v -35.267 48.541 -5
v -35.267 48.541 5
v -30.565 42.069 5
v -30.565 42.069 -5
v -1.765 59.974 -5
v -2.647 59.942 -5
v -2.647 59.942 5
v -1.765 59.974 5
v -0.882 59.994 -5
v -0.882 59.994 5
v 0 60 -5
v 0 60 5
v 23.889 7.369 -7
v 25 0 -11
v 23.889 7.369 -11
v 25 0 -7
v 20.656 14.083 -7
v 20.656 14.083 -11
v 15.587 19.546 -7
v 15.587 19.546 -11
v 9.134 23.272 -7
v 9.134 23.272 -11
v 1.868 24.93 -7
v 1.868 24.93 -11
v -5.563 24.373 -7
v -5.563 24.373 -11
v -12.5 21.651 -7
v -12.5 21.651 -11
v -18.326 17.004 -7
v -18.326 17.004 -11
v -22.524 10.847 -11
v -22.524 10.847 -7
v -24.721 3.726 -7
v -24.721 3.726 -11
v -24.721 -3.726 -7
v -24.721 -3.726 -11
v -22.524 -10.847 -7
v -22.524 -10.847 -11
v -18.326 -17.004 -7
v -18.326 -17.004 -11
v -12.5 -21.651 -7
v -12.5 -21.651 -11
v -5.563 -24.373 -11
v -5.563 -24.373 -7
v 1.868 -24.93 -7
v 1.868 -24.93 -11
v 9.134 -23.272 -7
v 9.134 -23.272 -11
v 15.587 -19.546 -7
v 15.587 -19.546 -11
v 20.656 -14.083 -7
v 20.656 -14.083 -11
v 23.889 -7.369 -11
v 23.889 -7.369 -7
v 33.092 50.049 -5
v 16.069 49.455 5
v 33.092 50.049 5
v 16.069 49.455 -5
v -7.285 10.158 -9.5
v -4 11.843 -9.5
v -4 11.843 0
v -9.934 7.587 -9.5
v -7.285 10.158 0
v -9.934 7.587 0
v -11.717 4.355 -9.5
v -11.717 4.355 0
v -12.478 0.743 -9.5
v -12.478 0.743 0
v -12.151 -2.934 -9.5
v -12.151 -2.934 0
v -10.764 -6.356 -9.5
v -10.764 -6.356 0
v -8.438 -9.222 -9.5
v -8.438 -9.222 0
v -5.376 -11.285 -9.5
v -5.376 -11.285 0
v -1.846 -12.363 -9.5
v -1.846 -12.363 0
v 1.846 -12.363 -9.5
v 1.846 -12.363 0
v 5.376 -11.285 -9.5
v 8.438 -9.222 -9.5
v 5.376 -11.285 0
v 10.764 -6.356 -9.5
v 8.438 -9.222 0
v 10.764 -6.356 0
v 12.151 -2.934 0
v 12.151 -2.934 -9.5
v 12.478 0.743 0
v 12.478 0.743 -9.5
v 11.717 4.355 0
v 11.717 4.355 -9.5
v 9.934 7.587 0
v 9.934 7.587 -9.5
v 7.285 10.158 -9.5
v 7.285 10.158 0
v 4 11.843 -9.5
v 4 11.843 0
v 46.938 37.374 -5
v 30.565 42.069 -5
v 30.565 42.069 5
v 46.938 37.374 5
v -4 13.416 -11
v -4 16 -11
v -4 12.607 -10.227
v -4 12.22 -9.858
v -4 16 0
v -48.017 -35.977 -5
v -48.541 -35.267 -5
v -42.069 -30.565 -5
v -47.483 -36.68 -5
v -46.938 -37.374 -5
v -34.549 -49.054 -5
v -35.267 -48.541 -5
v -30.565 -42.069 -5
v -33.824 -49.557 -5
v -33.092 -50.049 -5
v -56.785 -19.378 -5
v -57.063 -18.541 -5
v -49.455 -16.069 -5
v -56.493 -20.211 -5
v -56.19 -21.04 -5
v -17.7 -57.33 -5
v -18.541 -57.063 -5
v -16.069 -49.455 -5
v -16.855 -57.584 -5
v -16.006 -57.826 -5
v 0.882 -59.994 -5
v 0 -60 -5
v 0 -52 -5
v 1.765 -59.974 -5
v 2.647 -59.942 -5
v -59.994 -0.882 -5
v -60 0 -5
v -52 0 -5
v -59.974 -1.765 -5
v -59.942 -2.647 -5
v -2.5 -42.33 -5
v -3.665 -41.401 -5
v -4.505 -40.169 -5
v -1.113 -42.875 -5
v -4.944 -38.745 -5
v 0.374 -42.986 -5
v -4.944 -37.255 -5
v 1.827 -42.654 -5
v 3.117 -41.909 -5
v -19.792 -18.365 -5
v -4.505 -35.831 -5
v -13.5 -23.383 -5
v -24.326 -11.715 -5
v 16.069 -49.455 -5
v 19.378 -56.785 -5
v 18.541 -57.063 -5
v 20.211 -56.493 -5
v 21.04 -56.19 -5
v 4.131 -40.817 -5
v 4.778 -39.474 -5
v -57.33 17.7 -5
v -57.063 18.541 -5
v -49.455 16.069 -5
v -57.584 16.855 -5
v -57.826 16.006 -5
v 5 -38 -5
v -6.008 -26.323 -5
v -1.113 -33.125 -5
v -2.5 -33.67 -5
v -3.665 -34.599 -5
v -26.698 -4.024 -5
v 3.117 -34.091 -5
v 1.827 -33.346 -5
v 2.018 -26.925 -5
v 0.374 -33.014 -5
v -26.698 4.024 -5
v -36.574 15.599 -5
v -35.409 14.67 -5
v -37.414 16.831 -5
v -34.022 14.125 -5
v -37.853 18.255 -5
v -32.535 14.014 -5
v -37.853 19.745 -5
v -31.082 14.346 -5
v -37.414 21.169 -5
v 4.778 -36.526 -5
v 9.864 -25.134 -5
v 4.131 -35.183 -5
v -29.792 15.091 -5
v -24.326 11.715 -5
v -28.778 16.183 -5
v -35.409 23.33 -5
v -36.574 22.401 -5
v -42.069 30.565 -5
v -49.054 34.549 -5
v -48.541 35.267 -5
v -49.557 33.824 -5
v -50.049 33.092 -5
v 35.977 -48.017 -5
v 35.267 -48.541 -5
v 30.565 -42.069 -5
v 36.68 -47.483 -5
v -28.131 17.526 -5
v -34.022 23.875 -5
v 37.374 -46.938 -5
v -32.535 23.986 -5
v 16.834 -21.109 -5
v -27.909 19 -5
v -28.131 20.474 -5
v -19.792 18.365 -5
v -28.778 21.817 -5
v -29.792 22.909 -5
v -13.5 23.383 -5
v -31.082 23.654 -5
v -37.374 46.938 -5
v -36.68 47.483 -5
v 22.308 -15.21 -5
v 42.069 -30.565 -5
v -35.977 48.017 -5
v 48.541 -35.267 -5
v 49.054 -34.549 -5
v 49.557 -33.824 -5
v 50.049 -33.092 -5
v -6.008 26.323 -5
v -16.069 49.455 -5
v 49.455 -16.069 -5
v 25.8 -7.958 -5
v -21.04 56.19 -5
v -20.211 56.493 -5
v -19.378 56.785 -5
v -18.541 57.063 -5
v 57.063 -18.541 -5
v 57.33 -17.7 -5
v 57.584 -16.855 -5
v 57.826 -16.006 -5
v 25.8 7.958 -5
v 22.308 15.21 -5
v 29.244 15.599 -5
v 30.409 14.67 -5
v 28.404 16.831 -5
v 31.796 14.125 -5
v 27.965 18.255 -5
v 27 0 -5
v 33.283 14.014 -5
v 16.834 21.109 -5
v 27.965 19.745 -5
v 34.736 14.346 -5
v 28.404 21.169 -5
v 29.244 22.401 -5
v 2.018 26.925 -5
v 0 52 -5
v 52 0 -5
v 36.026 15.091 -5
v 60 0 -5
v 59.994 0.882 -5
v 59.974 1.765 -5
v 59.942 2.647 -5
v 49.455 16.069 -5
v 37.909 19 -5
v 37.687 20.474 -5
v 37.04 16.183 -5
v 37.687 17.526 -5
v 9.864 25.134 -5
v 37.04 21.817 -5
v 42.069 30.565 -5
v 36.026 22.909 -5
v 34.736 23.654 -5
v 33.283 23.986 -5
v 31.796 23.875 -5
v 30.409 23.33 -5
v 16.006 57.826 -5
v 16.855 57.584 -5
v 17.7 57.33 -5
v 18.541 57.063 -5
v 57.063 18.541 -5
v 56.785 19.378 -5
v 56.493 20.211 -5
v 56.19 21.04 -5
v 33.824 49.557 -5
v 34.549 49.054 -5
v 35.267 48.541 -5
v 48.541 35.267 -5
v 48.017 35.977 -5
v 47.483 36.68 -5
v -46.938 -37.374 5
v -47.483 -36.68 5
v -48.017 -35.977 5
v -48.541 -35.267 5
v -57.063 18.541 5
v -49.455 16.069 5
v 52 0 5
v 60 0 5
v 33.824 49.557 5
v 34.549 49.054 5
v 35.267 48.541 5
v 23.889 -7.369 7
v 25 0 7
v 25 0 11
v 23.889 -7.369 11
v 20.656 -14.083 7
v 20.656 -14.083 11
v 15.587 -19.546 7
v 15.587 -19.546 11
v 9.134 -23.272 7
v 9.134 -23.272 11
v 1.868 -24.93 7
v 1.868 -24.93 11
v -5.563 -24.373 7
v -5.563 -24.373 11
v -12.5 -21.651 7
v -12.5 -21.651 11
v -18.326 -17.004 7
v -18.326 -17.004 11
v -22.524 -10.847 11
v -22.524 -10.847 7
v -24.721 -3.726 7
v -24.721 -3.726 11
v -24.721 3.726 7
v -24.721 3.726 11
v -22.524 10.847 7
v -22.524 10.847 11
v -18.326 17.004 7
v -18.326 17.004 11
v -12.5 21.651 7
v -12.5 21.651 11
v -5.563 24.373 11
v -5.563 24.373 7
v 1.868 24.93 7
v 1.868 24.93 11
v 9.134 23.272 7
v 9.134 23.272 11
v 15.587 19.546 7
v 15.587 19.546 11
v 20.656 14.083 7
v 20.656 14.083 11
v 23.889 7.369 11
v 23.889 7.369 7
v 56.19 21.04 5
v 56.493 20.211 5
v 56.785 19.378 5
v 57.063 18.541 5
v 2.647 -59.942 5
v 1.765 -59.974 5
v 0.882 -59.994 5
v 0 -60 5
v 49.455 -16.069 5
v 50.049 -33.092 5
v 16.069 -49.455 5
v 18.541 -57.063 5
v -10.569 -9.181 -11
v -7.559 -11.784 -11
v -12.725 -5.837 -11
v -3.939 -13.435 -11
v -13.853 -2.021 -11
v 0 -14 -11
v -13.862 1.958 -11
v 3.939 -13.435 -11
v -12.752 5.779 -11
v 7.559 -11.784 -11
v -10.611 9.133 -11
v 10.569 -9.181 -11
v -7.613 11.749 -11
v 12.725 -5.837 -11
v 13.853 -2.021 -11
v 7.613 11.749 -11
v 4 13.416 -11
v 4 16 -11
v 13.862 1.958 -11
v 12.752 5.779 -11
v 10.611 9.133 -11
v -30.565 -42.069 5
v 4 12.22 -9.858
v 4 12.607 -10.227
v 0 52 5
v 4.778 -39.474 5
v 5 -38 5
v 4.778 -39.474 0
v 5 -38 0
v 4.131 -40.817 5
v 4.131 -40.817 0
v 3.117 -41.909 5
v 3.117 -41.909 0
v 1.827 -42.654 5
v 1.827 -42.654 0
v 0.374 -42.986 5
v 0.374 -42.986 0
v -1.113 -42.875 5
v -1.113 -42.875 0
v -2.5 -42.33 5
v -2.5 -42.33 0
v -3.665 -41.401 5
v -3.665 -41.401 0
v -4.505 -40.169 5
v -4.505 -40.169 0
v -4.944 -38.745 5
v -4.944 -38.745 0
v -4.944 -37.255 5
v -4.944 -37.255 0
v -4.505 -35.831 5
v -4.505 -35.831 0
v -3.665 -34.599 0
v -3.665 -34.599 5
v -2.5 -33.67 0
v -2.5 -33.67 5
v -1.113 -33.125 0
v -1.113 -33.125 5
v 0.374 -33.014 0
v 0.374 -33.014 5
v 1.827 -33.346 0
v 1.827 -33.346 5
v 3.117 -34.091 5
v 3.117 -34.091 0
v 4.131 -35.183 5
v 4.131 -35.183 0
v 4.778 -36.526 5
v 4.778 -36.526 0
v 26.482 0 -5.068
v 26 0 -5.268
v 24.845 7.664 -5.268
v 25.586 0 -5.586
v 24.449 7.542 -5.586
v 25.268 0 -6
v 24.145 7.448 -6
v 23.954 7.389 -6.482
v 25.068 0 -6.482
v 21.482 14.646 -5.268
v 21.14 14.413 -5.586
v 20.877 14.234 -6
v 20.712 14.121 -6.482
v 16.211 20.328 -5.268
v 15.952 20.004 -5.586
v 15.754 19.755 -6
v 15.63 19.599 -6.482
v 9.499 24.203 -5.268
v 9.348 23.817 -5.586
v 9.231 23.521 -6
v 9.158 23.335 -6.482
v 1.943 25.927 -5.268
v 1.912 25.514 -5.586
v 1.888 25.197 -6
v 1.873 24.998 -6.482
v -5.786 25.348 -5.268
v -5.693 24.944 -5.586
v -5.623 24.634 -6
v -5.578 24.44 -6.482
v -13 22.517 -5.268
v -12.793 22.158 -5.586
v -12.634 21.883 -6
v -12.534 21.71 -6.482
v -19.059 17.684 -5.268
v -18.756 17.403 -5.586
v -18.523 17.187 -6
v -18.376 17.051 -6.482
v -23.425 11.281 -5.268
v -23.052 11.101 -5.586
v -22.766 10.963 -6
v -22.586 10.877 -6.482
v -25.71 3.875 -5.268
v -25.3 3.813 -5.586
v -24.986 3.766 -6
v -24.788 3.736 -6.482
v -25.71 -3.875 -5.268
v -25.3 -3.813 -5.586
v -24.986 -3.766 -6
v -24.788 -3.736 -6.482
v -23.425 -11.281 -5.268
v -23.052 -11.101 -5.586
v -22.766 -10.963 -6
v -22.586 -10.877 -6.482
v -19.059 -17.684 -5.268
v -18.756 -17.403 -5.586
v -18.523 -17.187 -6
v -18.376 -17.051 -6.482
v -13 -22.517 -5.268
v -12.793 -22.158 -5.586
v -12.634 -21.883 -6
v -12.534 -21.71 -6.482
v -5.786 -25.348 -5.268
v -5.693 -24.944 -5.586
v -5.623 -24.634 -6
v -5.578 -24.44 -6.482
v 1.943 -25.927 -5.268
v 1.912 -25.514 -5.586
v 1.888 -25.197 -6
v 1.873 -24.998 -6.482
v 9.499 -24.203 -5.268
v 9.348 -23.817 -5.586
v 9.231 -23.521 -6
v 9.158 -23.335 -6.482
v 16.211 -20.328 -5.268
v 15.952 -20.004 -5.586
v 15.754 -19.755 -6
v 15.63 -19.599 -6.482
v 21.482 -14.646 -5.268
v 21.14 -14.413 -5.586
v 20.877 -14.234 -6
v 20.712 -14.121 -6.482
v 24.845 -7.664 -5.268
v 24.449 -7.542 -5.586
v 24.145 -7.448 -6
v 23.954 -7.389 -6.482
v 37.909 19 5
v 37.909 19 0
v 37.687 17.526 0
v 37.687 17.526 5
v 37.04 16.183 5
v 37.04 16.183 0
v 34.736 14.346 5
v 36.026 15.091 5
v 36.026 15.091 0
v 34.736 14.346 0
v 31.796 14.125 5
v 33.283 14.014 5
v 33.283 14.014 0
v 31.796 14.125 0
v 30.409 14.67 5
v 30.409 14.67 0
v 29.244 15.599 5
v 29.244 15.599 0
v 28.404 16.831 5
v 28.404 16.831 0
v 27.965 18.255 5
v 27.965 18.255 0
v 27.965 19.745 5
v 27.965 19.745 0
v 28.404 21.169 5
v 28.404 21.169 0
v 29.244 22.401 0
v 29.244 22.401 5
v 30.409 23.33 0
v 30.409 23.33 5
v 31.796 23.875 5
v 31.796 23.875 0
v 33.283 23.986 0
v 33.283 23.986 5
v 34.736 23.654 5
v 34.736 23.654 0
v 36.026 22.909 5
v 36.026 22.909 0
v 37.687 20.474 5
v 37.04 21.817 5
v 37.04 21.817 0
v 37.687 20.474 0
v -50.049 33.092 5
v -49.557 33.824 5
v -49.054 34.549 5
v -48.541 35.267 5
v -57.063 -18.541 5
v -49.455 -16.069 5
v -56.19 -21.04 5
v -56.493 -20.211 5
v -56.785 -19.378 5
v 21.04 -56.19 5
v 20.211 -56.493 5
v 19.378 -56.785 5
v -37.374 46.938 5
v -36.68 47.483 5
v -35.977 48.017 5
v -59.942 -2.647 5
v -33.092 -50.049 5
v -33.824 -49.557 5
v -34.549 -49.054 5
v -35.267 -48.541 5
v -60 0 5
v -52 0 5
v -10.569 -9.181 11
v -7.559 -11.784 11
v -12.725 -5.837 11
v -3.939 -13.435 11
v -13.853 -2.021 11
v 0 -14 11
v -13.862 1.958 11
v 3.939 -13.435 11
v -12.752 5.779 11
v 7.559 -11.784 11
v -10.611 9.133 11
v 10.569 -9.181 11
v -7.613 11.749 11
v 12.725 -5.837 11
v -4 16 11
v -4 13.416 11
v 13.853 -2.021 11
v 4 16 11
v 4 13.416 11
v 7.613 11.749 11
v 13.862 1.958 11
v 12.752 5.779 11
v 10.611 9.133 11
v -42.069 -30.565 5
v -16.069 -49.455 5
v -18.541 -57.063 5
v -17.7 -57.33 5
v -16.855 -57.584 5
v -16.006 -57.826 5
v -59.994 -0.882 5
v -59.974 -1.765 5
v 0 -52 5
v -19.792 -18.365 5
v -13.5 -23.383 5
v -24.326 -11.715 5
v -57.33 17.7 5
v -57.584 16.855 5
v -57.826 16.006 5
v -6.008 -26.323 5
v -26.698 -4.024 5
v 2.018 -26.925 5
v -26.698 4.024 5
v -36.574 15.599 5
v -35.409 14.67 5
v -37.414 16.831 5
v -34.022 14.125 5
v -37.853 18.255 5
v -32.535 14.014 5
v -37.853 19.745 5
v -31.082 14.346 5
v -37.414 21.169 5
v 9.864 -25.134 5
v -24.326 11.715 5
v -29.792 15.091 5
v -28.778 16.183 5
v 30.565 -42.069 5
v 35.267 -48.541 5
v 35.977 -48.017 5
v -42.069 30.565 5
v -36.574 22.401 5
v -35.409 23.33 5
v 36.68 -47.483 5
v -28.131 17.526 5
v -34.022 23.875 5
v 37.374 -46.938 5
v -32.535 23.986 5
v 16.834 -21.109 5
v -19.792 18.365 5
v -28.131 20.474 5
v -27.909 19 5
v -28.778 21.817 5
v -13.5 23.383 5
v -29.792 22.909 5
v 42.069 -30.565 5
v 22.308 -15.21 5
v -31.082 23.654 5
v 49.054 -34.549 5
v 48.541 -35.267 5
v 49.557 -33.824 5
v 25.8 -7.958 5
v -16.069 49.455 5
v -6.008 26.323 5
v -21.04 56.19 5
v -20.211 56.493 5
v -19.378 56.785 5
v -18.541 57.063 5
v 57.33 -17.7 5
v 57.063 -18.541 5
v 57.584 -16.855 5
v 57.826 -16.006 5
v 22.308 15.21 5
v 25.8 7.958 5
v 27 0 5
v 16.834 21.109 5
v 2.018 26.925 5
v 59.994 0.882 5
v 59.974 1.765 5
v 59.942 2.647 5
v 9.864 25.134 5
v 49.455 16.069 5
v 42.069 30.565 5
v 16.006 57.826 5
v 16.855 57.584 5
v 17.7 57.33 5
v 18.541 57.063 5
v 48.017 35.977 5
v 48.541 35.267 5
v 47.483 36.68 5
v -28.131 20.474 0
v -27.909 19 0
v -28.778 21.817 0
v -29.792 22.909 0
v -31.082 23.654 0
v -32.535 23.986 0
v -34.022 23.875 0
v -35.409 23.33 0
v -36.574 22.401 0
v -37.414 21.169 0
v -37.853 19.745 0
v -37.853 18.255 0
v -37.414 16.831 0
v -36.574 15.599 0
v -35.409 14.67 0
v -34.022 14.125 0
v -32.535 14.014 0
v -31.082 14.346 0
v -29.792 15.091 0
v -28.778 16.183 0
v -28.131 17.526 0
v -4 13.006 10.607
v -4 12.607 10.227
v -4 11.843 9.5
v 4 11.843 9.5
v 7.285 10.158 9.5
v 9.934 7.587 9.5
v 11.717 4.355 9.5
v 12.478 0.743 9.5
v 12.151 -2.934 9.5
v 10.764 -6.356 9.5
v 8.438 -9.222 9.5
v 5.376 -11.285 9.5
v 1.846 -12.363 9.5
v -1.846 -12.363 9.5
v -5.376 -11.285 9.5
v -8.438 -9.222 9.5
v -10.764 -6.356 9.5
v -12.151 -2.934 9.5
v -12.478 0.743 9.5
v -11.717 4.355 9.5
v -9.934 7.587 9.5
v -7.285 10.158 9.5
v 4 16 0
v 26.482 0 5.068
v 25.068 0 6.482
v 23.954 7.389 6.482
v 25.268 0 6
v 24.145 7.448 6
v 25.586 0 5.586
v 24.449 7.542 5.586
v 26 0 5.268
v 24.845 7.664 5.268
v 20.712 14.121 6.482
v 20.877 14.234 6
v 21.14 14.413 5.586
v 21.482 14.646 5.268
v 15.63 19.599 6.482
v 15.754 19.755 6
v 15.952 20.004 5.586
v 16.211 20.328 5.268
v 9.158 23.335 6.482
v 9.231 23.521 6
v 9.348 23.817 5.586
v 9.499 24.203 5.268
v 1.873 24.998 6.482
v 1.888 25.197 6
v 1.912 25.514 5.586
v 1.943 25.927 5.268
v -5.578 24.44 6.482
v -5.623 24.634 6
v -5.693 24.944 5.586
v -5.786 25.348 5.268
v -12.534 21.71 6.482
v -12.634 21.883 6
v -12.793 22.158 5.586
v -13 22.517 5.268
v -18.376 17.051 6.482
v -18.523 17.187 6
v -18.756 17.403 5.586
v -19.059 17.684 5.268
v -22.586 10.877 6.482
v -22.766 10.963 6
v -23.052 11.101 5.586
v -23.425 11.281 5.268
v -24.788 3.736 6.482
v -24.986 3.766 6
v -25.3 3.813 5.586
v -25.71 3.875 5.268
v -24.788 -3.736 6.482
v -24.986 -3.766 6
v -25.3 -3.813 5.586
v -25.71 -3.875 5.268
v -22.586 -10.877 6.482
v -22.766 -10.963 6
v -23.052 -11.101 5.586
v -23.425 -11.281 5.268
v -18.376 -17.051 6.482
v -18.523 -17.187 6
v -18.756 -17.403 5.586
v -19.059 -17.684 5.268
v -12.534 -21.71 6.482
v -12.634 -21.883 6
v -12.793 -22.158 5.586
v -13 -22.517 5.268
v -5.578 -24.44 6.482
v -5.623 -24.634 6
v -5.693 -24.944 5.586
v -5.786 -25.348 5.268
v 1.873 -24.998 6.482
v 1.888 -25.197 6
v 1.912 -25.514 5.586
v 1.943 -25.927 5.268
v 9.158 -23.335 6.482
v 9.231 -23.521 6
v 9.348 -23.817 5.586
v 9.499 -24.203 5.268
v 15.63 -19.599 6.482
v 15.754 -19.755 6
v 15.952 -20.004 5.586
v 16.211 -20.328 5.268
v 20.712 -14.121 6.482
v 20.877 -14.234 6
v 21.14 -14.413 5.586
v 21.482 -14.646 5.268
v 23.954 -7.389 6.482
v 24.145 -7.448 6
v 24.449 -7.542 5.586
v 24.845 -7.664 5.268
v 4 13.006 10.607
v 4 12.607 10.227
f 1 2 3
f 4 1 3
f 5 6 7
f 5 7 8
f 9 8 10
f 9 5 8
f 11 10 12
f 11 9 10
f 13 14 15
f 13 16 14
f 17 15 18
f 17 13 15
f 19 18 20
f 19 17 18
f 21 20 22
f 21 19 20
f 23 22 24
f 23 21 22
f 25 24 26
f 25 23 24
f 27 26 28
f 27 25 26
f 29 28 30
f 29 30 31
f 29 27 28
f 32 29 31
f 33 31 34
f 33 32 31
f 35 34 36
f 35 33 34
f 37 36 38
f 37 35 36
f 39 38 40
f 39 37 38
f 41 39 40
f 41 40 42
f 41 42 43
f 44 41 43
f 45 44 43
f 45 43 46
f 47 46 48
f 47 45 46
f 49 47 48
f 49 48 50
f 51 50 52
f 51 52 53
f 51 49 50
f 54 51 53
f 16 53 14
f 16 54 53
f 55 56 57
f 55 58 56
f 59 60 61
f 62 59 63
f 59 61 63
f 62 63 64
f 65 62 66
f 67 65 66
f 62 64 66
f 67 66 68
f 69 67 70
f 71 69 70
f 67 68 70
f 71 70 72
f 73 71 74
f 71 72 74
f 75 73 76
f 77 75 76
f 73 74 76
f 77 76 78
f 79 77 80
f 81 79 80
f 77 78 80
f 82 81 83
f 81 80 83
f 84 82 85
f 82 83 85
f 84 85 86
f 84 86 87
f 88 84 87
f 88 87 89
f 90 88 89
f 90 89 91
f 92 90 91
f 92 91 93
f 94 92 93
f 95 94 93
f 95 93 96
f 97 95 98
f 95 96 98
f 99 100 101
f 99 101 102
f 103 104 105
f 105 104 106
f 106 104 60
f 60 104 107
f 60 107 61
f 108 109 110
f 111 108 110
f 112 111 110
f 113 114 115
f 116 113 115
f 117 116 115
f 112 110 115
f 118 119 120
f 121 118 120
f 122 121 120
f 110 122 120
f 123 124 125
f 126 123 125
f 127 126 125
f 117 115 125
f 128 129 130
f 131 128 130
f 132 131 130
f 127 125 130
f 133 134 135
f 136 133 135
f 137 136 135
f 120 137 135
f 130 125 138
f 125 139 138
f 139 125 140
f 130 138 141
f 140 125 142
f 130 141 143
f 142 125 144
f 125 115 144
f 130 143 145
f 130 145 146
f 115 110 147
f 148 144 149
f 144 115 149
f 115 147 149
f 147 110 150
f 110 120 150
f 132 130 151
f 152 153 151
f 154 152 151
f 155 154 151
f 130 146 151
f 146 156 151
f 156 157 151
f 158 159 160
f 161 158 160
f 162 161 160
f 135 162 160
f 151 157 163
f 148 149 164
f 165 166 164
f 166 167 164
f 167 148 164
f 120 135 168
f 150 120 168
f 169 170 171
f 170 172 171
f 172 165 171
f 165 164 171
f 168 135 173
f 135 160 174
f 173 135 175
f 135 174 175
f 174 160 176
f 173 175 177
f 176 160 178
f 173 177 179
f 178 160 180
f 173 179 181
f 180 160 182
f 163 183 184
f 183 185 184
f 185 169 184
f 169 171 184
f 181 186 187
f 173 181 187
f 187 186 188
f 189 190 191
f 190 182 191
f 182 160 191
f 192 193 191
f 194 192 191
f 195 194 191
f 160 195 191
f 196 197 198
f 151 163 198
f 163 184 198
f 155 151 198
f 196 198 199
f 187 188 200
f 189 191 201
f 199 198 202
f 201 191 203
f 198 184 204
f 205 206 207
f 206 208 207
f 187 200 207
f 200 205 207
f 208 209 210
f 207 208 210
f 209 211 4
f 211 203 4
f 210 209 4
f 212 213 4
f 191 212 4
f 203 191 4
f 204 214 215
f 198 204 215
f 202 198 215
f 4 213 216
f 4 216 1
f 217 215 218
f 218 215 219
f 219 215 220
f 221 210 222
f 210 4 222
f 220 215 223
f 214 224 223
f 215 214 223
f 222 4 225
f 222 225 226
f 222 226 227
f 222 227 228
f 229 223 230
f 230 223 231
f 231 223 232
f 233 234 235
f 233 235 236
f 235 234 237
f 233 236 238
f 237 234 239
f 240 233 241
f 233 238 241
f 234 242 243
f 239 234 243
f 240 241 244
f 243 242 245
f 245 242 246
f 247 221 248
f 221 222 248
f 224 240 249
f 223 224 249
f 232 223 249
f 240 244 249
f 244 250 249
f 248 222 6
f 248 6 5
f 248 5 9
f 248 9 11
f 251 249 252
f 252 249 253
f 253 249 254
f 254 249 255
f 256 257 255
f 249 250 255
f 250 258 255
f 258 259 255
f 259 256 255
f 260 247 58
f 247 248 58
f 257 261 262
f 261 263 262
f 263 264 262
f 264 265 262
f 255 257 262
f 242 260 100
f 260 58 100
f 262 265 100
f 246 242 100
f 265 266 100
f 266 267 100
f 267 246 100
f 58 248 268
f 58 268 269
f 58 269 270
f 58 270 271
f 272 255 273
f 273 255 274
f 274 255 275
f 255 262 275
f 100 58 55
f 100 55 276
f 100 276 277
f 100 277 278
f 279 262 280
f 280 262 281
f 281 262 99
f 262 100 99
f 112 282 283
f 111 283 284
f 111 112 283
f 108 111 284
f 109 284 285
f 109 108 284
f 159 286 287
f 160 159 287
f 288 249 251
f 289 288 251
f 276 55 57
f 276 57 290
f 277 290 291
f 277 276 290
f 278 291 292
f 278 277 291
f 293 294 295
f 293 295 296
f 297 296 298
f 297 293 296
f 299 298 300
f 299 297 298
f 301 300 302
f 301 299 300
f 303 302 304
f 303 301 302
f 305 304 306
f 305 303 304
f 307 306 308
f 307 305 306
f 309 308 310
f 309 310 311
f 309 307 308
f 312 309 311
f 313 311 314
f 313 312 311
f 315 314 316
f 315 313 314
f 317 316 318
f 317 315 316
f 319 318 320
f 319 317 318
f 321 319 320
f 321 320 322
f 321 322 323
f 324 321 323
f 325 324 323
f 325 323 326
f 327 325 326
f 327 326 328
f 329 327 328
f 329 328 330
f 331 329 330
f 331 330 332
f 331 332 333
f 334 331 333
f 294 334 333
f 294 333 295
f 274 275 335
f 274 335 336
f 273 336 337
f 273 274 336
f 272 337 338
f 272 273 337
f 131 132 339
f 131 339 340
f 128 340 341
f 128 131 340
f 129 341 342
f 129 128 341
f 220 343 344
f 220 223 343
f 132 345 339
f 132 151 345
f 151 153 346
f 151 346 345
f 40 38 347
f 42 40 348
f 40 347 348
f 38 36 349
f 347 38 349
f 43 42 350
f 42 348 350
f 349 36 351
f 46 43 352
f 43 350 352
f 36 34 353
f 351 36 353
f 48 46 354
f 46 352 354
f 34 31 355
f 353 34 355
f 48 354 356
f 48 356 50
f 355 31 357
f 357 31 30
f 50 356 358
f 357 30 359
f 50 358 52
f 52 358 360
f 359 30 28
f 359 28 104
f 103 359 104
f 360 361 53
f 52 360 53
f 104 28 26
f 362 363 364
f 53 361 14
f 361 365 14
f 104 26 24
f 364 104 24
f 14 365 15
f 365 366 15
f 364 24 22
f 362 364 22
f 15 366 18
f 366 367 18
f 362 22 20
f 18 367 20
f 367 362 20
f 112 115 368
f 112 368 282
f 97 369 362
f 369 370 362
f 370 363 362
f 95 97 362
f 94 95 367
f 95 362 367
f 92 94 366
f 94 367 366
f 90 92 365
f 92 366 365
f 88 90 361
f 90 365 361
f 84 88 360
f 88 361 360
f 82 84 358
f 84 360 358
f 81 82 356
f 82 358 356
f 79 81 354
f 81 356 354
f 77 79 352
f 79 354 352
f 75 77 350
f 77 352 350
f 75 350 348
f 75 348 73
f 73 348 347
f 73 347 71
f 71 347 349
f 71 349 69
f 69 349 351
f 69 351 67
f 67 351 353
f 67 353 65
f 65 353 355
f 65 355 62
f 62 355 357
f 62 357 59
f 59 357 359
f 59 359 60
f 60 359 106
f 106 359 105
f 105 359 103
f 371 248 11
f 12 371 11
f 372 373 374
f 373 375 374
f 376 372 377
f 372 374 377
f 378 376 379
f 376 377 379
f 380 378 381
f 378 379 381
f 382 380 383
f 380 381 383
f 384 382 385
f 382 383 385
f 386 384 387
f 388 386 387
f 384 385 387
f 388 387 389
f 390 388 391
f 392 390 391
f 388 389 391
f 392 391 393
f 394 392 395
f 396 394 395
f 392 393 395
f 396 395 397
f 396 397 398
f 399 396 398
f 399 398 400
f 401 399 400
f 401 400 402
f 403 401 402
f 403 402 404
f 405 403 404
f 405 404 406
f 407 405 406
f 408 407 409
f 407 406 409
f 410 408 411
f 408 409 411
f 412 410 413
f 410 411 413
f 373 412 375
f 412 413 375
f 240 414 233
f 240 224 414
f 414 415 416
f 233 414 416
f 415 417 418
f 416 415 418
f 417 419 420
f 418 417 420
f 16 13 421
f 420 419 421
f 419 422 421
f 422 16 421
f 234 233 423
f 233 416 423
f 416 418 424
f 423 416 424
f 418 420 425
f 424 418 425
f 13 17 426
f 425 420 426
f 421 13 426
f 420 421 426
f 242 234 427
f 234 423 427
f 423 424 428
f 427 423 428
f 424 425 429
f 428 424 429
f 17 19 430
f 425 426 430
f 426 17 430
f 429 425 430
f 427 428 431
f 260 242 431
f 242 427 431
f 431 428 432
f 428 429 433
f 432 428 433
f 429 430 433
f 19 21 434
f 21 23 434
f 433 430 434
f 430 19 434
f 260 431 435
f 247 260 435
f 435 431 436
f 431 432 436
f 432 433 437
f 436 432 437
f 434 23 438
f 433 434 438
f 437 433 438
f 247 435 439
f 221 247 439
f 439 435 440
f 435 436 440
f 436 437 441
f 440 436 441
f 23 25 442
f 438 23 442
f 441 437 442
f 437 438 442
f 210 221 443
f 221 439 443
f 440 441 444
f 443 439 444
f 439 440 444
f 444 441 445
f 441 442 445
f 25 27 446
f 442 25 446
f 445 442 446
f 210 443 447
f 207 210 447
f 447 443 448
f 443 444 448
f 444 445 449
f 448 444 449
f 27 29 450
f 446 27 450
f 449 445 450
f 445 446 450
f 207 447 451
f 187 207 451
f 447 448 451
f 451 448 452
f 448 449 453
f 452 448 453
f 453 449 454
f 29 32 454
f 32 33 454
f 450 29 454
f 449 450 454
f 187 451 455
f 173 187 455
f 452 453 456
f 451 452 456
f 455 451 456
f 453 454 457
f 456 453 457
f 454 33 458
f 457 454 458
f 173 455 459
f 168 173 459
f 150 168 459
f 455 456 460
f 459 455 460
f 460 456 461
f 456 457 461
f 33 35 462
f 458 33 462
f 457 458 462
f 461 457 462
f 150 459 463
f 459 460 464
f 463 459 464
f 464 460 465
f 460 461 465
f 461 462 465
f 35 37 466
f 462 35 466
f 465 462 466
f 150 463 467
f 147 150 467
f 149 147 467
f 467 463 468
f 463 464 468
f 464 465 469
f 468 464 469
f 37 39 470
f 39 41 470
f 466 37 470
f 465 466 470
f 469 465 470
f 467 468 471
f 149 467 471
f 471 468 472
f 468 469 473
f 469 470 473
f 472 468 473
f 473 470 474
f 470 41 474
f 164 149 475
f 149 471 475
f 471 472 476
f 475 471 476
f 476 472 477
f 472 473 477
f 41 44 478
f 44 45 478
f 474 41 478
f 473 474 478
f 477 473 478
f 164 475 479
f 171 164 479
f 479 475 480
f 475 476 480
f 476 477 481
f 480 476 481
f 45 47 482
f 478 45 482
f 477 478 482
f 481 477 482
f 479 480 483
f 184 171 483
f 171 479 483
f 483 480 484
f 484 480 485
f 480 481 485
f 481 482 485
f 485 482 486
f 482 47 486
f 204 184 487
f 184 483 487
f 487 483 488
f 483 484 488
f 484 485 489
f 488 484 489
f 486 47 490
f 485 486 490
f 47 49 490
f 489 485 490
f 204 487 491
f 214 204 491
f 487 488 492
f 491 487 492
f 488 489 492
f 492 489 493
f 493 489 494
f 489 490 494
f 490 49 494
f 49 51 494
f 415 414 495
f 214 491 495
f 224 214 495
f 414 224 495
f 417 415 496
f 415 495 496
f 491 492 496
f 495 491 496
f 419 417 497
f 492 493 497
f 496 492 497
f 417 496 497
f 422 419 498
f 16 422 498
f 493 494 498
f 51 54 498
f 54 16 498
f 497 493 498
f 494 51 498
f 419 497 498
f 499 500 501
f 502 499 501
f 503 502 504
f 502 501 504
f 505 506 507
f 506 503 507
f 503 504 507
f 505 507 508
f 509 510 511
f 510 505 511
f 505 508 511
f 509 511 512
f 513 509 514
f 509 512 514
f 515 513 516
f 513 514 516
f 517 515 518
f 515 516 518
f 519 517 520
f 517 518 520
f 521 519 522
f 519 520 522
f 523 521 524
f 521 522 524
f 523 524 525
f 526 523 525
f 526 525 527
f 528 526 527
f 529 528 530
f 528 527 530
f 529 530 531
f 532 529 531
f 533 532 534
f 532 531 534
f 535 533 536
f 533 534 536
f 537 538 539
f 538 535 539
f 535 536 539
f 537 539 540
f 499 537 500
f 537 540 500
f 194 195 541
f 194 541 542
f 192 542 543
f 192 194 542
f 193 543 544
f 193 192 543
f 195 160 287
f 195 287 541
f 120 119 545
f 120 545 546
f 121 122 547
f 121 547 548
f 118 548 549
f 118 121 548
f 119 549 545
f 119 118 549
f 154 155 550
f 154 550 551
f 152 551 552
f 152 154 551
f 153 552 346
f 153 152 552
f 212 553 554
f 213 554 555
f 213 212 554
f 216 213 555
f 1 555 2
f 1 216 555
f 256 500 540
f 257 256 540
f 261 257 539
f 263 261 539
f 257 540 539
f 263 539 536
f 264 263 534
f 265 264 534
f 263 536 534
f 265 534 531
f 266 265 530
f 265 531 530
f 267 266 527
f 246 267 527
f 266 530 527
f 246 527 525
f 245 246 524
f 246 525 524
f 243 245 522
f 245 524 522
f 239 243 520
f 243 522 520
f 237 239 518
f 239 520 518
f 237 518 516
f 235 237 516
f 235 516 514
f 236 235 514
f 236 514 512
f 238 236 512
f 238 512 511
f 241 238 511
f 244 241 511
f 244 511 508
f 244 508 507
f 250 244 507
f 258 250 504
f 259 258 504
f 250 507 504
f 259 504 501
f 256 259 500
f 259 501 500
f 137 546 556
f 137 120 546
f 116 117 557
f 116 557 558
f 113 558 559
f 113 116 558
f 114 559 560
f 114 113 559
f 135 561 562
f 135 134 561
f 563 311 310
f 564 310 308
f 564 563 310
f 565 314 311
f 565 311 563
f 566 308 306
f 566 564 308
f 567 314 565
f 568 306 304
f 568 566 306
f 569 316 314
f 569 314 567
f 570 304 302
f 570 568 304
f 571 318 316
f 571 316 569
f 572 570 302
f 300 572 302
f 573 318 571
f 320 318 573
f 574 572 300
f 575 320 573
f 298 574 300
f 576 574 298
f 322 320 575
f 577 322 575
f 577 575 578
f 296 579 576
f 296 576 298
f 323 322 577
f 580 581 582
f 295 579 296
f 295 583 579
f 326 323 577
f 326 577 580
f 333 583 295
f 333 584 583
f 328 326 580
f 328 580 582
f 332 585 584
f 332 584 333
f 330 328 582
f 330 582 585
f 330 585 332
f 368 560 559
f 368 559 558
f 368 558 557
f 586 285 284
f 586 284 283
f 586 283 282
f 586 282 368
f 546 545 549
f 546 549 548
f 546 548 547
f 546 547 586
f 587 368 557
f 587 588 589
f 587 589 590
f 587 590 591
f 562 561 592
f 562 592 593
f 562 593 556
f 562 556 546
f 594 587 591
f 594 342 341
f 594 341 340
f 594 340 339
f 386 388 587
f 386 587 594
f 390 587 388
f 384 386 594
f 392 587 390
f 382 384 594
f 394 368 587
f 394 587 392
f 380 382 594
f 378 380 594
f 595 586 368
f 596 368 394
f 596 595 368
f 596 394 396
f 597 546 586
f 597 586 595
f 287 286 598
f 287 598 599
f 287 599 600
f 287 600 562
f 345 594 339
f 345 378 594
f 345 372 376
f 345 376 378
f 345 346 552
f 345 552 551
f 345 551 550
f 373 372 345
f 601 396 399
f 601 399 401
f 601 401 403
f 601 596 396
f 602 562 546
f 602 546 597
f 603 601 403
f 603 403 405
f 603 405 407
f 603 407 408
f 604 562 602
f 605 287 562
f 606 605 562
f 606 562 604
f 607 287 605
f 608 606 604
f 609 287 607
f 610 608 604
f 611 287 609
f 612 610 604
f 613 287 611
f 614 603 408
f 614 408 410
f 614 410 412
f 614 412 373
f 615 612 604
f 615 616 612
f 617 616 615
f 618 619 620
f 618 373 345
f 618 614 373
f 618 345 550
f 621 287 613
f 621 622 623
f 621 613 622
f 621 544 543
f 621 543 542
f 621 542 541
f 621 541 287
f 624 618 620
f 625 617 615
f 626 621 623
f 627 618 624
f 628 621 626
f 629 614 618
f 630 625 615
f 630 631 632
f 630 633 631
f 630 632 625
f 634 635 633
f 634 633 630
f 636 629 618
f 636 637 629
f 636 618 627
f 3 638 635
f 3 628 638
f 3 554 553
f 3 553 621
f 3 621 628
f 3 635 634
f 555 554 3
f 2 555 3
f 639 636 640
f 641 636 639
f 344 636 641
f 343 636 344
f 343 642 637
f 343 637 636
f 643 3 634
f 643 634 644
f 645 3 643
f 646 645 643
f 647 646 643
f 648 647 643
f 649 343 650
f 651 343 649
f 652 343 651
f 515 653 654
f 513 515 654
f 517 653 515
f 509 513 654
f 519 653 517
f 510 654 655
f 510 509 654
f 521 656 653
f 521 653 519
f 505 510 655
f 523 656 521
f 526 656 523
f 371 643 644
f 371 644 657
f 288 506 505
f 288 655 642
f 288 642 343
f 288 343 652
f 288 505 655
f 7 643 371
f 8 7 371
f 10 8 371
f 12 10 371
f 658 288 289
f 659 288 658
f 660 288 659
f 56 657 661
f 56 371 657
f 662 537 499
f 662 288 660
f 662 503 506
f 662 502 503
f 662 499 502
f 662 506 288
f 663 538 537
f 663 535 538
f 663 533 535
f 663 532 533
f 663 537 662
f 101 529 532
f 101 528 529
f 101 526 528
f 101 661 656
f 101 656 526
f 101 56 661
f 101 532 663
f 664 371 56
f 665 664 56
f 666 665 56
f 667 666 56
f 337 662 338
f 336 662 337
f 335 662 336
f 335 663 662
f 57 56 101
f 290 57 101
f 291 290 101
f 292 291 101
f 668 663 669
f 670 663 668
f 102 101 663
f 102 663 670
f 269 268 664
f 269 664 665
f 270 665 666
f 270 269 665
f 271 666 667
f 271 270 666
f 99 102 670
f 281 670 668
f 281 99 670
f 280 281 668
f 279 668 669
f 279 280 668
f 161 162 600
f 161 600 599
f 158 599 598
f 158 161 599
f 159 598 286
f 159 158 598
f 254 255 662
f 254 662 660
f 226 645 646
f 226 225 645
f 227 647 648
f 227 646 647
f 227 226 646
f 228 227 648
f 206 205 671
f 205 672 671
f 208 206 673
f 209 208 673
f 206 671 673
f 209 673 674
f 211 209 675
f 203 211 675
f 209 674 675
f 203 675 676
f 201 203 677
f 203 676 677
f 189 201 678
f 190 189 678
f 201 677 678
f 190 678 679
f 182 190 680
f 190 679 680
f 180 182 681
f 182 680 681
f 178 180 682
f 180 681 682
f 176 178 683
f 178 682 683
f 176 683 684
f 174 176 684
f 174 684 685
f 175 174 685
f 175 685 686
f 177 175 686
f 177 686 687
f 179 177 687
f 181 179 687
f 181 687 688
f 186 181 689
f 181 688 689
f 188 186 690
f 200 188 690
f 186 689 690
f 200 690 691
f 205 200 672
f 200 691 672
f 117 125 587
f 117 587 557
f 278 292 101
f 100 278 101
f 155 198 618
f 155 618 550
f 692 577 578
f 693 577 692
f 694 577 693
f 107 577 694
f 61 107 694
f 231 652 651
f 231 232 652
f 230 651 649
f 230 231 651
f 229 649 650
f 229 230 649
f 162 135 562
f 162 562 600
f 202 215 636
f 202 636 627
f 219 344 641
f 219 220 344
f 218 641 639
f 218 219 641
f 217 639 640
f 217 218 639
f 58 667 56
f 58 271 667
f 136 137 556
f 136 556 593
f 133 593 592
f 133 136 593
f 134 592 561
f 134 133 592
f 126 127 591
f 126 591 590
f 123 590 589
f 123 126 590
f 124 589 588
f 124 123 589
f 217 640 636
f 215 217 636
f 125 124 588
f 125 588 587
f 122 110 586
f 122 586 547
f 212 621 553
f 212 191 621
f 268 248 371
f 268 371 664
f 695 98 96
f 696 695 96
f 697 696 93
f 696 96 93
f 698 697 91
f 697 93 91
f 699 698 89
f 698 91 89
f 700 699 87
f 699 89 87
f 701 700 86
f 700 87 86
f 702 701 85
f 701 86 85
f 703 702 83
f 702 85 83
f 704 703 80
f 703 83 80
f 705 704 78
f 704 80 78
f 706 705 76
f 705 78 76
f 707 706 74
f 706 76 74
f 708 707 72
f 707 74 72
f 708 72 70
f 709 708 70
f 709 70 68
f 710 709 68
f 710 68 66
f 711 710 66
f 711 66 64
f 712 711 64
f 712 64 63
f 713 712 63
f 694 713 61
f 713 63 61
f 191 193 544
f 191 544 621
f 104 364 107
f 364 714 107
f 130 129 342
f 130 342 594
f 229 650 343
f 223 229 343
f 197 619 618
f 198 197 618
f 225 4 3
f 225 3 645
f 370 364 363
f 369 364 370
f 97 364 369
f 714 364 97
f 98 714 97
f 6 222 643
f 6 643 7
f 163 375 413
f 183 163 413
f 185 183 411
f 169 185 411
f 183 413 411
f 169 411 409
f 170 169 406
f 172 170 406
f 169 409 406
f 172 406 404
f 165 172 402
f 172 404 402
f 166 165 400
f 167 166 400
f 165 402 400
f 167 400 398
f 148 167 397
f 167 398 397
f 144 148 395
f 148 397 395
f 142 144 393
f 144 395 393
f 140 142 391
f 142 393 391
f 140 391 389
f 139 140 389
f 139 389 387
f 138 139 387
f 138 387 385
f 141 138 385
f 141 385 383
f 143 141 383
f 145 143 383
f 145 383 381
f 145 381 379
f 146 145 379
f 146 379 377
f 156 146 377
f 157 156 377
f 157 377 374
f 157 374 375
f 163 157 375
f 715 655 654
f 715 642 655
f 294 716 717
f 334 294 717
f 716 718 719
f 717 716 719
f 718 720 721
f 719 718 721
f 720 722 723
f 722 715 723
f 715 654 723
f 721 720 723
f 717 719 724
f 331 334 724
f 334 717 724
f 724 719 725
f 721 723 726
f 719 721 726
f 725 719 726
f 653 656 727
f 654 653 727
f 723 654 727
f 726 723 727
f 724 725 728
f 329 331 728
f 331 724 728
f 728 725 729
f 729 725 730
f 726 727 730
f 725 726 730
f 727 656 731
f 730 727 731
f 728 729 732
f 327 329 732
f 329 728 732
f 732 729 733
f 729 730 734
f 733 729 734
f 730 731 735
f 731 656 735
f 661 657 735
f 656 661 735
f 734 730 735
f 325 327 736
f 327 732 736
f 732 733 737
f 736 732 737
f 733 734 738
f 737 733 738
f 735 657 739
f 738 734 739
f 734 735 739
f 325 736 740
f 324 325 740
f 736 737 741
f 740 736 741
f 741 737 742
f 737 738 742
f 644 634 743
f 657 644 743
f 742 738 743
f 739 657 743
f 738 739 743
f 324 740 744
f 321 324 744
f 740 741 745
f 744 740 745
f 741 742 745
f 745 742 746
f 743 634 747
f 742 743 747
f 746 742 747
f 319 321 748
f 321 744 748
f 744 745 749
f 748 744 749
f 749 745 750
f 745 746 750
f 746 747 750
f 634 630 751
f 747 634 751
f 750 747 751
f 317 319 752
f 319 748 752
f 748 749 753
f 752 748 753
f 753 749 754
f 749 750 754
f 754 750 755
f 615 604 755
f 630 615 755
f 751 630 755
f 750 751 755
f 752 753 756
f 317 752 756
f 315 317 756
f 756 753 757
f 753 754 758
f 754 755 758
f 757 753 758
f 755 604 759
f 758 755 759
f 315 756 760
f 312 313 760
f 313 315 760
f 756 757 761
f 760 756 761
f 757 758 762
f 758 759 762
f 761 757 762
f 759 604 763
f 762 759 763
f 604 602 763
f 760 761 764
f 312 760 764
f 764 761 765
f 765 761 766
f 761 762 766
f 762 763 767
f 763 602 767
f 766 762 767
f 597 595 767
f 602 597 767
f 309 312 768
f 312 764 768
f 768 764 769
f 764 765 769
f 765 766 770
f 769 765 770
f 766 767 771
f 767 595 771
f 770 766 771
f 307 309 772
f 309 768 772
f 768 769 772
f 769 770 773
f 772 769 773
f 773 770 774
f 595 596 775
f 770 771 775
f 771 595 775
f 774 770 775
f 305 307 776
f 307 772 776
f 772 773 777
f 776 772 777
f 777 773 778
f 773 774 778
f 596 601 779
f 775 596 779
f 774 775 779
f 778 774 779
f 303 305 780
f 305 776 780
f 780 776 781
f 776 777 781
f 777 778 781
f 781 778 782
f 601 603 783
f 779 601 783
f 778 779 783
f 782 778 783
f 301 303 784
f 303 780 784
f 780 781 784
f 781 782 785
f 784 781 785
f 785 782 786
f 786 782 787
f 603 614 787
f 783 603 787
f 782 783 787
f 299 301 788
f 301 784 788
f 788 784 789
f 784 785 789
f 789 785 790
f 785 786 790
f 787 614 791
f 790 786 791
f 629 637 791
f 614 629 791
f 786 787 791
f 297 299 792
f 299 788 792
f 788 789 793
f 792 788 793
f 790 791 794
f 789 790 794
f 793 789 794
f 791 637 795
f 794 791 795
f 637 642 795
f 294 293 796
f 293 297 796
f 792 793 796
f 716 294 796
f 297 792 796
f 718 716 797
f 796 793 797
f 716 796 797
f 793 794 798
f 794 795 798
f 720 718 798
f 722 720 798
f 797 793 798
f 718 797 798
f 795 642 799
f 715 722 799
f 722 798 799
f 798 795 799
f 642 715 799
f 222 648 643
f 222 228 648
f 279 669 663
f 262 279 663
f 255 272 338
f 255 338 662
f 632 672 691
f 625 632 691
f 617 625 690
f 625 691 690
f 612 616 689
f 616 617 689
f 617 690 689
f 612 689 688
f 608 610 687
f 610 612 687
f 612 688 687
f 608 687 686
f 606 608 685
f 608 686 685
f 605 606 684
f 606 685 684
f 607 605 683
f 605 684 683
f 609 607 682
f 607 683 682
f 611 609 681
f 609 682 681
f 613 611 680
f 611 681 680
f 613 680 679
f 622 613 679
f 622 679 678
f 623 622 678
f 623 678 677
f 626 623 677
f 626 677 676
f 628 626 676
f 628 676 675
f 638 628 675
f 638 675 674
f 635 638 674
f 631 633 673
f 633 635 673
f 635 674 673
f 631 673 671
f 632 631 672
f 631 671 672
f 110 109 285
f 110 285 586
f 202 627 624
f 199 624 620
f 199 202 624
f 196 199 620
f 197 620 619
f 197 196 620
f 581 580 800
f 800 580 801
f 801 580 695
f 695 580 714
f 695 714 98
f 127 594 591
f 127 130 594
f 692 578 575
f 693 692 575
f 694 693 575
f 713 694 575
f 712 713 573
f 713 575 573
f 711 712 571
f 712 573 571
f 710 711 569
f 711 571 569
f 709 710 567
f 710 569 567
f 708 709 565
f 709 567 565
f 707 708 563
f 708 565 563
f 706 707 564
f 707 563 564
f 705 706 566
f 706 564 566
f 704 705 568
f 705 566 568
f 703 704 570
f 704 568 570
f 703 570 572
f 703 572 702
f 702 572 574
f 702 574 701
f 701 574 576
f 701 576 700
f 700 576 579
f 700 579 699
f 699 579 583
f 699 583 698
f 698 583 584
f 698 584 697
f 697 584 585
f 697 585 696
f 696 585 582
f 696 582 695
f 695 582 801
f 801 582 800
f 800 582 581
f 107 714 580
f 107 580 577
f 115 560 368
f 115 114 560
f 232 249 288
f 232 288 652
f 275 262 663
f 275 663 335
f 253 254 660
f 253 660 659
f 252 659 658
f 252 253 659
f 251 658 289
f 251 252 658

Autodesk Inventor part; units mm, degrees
ref_plane "YZ Plane" through (0, 0, 0) normal (1, 0, 0) x (0, 1, 0)
ref_plane "XZ Plane" through (0, 0, 0) normal (0, 1, 0) x (-1, 0, 0)
ref_plane "XY Plane" through (0, 0, 0) normal (0, 0, 1) x (1, 0, 0)
sketch "Sketch1" plane through (0, 0, 0) normal (0, 0, 1) x (1, 0, 0)
  line L0 (-84.0204, 0) -> (84.0204, 0) projected
  line L1 (0, -84.0204) -> (0, 84.0204) projected
  arc A0 (-4, 11.8427) -> (4, 11.8427) centre (0, 0) ccw
  line L2 (0, 16) -> (4, 16)
  line L3 (4, 16) -> (4, 11.8427)
  line L4 (0, 16) -> (-4, 16)
  line L5 (-4, 16) -> (-4, 11.8427)
  circle A1 centre (0, 0) radius 25
  circle A2 centre (0, 0) radius 38 construction
  arc A3 (18.541, 57.0634) -> (16.0059, 57.8257) centre (0, 0) ccw
  circle A4 centre (32.909, 19) radius 5
  line L6 (32.909, 19) -> (0, 0) construction
  circle A5 centre (-32.909, 19) radius 5
  circle A6 centre (0, -38) radius 5
  line L7 (0, 60) -> (0, 52)
  line L8 (0, 52) -> (16.0059, 57.8257)
  line L9 (18.541, 57.0634) -> (16.0689, 49.4549)
  line L10 (-16.0689, 49.4549) -> (-2.6466, 59.9416)
  arc A7 (0, 60) -> (-2.6466, 59.9416) centre (0, 0) ccw
  line L11 (0, 60) -> (0, 52)
  line L12 (-30.5648, 42.0689) -> (-21.04, 56.19)
  arc A8 (-18.541, 57.0634) -> (-21.04, 56.19) centre (0, 0) ccw
  line L13 (-18.541, 57.0634) -> (-16.0689, 49.4549)
  line L14 (-42.0689, 30.5648) -> (-37.3739, 46.9382)
  arc A9 (-35.2671, 48.541) -> (-37.3739, 46.9382) centre (0, 0) ccw
  line L15 (-35.2671, 48.541) -> (-30.5648, 42.0689)
  line L16 (-49.4549, 16.0689) -> (-50.0494, 33.0917)
  arc A10 (-48.541, 35.2671) -> (-50.0494, 33.0917) centre (0, 0) ccw
  line L17 (-48.541, 35.2671) -> (-42.0689, 30.5648)
  line L18 (-52, 0) -> (-57.8257, 16.0059)
  arc A11 (-57.0634, 18.541) -> (-57.8257, 16.0059) centre (0, 0) ccw
  line L19 (-57.0634, 18.541) -> (-49.4549, 16.0689)
  line L20 (-49.4549, -16.0689) -> (-59.9416, -2.6466)
  arc A12 (-60, 0) -> (-59.9416, -2.6466) centre (0, 0) ccw
  line L21 (-60, 0) -> (-52, 0)
  line L22 (-42.0689, -30.5648) -> (-56.19, -21.04)
  arc A13 (-57.0634, -18.541) -> (-56.19, -21.04) centre (0, 0) ccw
  line L23 (-57.0634, -18.541) -> (-49.4549, -16.0689)
  line L24 (-30.5648, -42.0689) -> (-46.9382, -37.3739)
  arc A14 (-48.541, -35.2671) -> (-46.9382, -37.3739) centre (0, 0) ccw
  line L25 (-48.541, -35.2671) -> (-42.0689, -30.5648)
  line L26 (-16.0689, -49.4549) -> (-33.0917, -50.0494)
  arc A15 (-35.2671, -48.541) -> (-33.0917, -50.0494) centre (0, 0) ccw
  line L27 (-35.2671, -48.541) -> (-30.5648, -42.0689)
  line L28 (0, -52) -> (-16.0059, -57.8257)
  arc A16 (-18.541, -57.0634) -> (-16.0059, -57.8257) centre (0, 0) ccw
  line L29 (-18.541, -57.0634) -> (-16.0689, -49.4549)
  line L30 (16.0689, -49.4549) -> (2.6466, -59.9416)
  arc A17 (0, -60) -> (2.6466, -59.9416) centre (0, 0) ccw
  line L31 (0, -60) -> (0, -52)
  line L32 (30.5648, -42.0689) -> (21.04, -56.19)
  arc A18 (18.541, -57.0634) -> (21.04, -56.19) centre (0, 0) ccw
  line L33 (18.541, -57.0634) -> (16.0689, -49.4549)
  line L34 (42.0689, -30.5648) -> (37.3739, -46.9382)
  arc A19 (35.2671, -48.541) -> (37.3739, -46.9382) centre (0, 0) ccw
  line L35 (35.2671, -48.541) -> (30.5648, -42.0689)
  line L36 (49.4549, -16.0689) -> (50.0494, -33.0917)
  arc A20 (48.541, -35.2671) -> (50.0494, -33.0917) centre (0, 0) ccw
  line L37 (48.541, -35.2671) -> (42.0689, -30.5648)
  line L38 (52, 0) -> (57.8257, -16.0059)
  arc A21 (57.0634, -18.541) -> (57.8257, -16.0059) centre (0, 0) ccw
  line L39 (57.0634, -18.541) -> (49.4549, -16.0689)
  line L40 (49.4549, 16.0689) -> (59.9416, 2.6466)
  arc A22 (60, 0) -> (59.9416, 2.6466) centre (0, 0) ccw
  line L41 (60, 0) -> (52, 0)
  line L42 (42.0689, 30.5648) -> (56.19, 21.04)
  arc A23 (57.0634, 18.541) -> (56.19, 21.04) centre (0, 0) ccw
  line L43 (57.0634, 18.541) -> (49.4549, 16.0689)
  line L44 (30.5648, 42.0689) -> (46.9382, 37.3739)
  arc A24 (48.541, 35.2671) -> (46.9382, 37.3739) centre (0, 0) ccw
  line L45 (48.541, 35.2671) -> (42.0689, 30.5648)
  line L46 (16.0689, 49.4549) -> (33.0917, 50.0494)
  arc A25 (35.2671, 48.541) -> (33.0917, 50.0494) centre (0, 0) ccw
  line L47 (35.2671, 48.541) -> (30.5648, 42.0689)
  point P0 (0, -12.5)
  point P1 (-2, 16)
  point P2 (17.305, 53.2592)
  point P3 (0, 56)
  point P4 (-17.305, 53.2592)
  point P5 (-32.916, 45.305)
  point P6 (-45.305, 32.916)
  point P7 (-53.2592, 17.305)
  point P8 (-56, 0)
  point P9 (-53.2592, -17.305)
  point P10 (-45.305, -32.916)
  point P11 (-32.916, -45.305)
  point P12 (-17.305, -53.2592)
  point P13 (0, -56)
  point P14 (17.305, -53.2592)
  point P15 (32.916, -45.305)
  point P16 (45.305, -32.916)
  point P17 (53.2592, -17.305)
  point P18 (56, 0)
  point P19 (53.2592, 17.305)
  point P20 (45.305, 32.916)
  point P21 (32.916, 45.305)
  point P22 (-60, 0)
  point P23 (0, -60)
  point P24 (60, 0)
  dimension "d4" = 76
  dimension "d0" = 25
  dimension "d1" = 8
  dimension "d2" = 28.5
  dimension "d3" = 50
  dimension "d5" = 120
  dimension "d6" = 10
  dimension "d7" = 60
  dimension "d10" = 360
  dimension "d12" = 8
  dimension "d13" = 70
  dimension "d14" = 8
  dimension "d15" = 18
  dimension "d19" = 360
  dimension "d21" = 17.0332
extrude "Extrusion1" add sketch "Sketch1" along normal mid plane 22 contours A1 L1 L4 L5 A0 L0 | L0 A0 L1 A1 | A1 L0 A0 L3 L2 L1 | L1 A0 L0 A1
extrude "Extrusion2" add sketch "Sketch1" along normal mid plane 10 contours L0 A1 L1 A6 L28 A16 L29 L26 A15 L27 L24 A14 L25 L22 A13 L23 L20 A12 | L18 A11 L19 L16 A10 L17 L14 A9 L15 L12 A8 L13 L10 A7 L1 A1 L0 | L1 L8 A3 L9 L46 A25 L47 L44 A24 L45 L42 A23 L43 L40 A22 L0 A1 | A1 L0 L38 A21 L39 L36 A20 L37 L34 A19 L35 L32 A18 L33 L30 A17 L1 A6
fillet "Fillet1" radius 2 2 edges at (-25, 0, 5) (-25, 0, -5)
chamfer "Chamfer1" distance 1.5 angle 45 2 edges at (0, -12.5, 11) (0, -12.5, -11) measured on face at (-4.9522, 11.4772, 3.6667)
properties part number "Piesa 35"
